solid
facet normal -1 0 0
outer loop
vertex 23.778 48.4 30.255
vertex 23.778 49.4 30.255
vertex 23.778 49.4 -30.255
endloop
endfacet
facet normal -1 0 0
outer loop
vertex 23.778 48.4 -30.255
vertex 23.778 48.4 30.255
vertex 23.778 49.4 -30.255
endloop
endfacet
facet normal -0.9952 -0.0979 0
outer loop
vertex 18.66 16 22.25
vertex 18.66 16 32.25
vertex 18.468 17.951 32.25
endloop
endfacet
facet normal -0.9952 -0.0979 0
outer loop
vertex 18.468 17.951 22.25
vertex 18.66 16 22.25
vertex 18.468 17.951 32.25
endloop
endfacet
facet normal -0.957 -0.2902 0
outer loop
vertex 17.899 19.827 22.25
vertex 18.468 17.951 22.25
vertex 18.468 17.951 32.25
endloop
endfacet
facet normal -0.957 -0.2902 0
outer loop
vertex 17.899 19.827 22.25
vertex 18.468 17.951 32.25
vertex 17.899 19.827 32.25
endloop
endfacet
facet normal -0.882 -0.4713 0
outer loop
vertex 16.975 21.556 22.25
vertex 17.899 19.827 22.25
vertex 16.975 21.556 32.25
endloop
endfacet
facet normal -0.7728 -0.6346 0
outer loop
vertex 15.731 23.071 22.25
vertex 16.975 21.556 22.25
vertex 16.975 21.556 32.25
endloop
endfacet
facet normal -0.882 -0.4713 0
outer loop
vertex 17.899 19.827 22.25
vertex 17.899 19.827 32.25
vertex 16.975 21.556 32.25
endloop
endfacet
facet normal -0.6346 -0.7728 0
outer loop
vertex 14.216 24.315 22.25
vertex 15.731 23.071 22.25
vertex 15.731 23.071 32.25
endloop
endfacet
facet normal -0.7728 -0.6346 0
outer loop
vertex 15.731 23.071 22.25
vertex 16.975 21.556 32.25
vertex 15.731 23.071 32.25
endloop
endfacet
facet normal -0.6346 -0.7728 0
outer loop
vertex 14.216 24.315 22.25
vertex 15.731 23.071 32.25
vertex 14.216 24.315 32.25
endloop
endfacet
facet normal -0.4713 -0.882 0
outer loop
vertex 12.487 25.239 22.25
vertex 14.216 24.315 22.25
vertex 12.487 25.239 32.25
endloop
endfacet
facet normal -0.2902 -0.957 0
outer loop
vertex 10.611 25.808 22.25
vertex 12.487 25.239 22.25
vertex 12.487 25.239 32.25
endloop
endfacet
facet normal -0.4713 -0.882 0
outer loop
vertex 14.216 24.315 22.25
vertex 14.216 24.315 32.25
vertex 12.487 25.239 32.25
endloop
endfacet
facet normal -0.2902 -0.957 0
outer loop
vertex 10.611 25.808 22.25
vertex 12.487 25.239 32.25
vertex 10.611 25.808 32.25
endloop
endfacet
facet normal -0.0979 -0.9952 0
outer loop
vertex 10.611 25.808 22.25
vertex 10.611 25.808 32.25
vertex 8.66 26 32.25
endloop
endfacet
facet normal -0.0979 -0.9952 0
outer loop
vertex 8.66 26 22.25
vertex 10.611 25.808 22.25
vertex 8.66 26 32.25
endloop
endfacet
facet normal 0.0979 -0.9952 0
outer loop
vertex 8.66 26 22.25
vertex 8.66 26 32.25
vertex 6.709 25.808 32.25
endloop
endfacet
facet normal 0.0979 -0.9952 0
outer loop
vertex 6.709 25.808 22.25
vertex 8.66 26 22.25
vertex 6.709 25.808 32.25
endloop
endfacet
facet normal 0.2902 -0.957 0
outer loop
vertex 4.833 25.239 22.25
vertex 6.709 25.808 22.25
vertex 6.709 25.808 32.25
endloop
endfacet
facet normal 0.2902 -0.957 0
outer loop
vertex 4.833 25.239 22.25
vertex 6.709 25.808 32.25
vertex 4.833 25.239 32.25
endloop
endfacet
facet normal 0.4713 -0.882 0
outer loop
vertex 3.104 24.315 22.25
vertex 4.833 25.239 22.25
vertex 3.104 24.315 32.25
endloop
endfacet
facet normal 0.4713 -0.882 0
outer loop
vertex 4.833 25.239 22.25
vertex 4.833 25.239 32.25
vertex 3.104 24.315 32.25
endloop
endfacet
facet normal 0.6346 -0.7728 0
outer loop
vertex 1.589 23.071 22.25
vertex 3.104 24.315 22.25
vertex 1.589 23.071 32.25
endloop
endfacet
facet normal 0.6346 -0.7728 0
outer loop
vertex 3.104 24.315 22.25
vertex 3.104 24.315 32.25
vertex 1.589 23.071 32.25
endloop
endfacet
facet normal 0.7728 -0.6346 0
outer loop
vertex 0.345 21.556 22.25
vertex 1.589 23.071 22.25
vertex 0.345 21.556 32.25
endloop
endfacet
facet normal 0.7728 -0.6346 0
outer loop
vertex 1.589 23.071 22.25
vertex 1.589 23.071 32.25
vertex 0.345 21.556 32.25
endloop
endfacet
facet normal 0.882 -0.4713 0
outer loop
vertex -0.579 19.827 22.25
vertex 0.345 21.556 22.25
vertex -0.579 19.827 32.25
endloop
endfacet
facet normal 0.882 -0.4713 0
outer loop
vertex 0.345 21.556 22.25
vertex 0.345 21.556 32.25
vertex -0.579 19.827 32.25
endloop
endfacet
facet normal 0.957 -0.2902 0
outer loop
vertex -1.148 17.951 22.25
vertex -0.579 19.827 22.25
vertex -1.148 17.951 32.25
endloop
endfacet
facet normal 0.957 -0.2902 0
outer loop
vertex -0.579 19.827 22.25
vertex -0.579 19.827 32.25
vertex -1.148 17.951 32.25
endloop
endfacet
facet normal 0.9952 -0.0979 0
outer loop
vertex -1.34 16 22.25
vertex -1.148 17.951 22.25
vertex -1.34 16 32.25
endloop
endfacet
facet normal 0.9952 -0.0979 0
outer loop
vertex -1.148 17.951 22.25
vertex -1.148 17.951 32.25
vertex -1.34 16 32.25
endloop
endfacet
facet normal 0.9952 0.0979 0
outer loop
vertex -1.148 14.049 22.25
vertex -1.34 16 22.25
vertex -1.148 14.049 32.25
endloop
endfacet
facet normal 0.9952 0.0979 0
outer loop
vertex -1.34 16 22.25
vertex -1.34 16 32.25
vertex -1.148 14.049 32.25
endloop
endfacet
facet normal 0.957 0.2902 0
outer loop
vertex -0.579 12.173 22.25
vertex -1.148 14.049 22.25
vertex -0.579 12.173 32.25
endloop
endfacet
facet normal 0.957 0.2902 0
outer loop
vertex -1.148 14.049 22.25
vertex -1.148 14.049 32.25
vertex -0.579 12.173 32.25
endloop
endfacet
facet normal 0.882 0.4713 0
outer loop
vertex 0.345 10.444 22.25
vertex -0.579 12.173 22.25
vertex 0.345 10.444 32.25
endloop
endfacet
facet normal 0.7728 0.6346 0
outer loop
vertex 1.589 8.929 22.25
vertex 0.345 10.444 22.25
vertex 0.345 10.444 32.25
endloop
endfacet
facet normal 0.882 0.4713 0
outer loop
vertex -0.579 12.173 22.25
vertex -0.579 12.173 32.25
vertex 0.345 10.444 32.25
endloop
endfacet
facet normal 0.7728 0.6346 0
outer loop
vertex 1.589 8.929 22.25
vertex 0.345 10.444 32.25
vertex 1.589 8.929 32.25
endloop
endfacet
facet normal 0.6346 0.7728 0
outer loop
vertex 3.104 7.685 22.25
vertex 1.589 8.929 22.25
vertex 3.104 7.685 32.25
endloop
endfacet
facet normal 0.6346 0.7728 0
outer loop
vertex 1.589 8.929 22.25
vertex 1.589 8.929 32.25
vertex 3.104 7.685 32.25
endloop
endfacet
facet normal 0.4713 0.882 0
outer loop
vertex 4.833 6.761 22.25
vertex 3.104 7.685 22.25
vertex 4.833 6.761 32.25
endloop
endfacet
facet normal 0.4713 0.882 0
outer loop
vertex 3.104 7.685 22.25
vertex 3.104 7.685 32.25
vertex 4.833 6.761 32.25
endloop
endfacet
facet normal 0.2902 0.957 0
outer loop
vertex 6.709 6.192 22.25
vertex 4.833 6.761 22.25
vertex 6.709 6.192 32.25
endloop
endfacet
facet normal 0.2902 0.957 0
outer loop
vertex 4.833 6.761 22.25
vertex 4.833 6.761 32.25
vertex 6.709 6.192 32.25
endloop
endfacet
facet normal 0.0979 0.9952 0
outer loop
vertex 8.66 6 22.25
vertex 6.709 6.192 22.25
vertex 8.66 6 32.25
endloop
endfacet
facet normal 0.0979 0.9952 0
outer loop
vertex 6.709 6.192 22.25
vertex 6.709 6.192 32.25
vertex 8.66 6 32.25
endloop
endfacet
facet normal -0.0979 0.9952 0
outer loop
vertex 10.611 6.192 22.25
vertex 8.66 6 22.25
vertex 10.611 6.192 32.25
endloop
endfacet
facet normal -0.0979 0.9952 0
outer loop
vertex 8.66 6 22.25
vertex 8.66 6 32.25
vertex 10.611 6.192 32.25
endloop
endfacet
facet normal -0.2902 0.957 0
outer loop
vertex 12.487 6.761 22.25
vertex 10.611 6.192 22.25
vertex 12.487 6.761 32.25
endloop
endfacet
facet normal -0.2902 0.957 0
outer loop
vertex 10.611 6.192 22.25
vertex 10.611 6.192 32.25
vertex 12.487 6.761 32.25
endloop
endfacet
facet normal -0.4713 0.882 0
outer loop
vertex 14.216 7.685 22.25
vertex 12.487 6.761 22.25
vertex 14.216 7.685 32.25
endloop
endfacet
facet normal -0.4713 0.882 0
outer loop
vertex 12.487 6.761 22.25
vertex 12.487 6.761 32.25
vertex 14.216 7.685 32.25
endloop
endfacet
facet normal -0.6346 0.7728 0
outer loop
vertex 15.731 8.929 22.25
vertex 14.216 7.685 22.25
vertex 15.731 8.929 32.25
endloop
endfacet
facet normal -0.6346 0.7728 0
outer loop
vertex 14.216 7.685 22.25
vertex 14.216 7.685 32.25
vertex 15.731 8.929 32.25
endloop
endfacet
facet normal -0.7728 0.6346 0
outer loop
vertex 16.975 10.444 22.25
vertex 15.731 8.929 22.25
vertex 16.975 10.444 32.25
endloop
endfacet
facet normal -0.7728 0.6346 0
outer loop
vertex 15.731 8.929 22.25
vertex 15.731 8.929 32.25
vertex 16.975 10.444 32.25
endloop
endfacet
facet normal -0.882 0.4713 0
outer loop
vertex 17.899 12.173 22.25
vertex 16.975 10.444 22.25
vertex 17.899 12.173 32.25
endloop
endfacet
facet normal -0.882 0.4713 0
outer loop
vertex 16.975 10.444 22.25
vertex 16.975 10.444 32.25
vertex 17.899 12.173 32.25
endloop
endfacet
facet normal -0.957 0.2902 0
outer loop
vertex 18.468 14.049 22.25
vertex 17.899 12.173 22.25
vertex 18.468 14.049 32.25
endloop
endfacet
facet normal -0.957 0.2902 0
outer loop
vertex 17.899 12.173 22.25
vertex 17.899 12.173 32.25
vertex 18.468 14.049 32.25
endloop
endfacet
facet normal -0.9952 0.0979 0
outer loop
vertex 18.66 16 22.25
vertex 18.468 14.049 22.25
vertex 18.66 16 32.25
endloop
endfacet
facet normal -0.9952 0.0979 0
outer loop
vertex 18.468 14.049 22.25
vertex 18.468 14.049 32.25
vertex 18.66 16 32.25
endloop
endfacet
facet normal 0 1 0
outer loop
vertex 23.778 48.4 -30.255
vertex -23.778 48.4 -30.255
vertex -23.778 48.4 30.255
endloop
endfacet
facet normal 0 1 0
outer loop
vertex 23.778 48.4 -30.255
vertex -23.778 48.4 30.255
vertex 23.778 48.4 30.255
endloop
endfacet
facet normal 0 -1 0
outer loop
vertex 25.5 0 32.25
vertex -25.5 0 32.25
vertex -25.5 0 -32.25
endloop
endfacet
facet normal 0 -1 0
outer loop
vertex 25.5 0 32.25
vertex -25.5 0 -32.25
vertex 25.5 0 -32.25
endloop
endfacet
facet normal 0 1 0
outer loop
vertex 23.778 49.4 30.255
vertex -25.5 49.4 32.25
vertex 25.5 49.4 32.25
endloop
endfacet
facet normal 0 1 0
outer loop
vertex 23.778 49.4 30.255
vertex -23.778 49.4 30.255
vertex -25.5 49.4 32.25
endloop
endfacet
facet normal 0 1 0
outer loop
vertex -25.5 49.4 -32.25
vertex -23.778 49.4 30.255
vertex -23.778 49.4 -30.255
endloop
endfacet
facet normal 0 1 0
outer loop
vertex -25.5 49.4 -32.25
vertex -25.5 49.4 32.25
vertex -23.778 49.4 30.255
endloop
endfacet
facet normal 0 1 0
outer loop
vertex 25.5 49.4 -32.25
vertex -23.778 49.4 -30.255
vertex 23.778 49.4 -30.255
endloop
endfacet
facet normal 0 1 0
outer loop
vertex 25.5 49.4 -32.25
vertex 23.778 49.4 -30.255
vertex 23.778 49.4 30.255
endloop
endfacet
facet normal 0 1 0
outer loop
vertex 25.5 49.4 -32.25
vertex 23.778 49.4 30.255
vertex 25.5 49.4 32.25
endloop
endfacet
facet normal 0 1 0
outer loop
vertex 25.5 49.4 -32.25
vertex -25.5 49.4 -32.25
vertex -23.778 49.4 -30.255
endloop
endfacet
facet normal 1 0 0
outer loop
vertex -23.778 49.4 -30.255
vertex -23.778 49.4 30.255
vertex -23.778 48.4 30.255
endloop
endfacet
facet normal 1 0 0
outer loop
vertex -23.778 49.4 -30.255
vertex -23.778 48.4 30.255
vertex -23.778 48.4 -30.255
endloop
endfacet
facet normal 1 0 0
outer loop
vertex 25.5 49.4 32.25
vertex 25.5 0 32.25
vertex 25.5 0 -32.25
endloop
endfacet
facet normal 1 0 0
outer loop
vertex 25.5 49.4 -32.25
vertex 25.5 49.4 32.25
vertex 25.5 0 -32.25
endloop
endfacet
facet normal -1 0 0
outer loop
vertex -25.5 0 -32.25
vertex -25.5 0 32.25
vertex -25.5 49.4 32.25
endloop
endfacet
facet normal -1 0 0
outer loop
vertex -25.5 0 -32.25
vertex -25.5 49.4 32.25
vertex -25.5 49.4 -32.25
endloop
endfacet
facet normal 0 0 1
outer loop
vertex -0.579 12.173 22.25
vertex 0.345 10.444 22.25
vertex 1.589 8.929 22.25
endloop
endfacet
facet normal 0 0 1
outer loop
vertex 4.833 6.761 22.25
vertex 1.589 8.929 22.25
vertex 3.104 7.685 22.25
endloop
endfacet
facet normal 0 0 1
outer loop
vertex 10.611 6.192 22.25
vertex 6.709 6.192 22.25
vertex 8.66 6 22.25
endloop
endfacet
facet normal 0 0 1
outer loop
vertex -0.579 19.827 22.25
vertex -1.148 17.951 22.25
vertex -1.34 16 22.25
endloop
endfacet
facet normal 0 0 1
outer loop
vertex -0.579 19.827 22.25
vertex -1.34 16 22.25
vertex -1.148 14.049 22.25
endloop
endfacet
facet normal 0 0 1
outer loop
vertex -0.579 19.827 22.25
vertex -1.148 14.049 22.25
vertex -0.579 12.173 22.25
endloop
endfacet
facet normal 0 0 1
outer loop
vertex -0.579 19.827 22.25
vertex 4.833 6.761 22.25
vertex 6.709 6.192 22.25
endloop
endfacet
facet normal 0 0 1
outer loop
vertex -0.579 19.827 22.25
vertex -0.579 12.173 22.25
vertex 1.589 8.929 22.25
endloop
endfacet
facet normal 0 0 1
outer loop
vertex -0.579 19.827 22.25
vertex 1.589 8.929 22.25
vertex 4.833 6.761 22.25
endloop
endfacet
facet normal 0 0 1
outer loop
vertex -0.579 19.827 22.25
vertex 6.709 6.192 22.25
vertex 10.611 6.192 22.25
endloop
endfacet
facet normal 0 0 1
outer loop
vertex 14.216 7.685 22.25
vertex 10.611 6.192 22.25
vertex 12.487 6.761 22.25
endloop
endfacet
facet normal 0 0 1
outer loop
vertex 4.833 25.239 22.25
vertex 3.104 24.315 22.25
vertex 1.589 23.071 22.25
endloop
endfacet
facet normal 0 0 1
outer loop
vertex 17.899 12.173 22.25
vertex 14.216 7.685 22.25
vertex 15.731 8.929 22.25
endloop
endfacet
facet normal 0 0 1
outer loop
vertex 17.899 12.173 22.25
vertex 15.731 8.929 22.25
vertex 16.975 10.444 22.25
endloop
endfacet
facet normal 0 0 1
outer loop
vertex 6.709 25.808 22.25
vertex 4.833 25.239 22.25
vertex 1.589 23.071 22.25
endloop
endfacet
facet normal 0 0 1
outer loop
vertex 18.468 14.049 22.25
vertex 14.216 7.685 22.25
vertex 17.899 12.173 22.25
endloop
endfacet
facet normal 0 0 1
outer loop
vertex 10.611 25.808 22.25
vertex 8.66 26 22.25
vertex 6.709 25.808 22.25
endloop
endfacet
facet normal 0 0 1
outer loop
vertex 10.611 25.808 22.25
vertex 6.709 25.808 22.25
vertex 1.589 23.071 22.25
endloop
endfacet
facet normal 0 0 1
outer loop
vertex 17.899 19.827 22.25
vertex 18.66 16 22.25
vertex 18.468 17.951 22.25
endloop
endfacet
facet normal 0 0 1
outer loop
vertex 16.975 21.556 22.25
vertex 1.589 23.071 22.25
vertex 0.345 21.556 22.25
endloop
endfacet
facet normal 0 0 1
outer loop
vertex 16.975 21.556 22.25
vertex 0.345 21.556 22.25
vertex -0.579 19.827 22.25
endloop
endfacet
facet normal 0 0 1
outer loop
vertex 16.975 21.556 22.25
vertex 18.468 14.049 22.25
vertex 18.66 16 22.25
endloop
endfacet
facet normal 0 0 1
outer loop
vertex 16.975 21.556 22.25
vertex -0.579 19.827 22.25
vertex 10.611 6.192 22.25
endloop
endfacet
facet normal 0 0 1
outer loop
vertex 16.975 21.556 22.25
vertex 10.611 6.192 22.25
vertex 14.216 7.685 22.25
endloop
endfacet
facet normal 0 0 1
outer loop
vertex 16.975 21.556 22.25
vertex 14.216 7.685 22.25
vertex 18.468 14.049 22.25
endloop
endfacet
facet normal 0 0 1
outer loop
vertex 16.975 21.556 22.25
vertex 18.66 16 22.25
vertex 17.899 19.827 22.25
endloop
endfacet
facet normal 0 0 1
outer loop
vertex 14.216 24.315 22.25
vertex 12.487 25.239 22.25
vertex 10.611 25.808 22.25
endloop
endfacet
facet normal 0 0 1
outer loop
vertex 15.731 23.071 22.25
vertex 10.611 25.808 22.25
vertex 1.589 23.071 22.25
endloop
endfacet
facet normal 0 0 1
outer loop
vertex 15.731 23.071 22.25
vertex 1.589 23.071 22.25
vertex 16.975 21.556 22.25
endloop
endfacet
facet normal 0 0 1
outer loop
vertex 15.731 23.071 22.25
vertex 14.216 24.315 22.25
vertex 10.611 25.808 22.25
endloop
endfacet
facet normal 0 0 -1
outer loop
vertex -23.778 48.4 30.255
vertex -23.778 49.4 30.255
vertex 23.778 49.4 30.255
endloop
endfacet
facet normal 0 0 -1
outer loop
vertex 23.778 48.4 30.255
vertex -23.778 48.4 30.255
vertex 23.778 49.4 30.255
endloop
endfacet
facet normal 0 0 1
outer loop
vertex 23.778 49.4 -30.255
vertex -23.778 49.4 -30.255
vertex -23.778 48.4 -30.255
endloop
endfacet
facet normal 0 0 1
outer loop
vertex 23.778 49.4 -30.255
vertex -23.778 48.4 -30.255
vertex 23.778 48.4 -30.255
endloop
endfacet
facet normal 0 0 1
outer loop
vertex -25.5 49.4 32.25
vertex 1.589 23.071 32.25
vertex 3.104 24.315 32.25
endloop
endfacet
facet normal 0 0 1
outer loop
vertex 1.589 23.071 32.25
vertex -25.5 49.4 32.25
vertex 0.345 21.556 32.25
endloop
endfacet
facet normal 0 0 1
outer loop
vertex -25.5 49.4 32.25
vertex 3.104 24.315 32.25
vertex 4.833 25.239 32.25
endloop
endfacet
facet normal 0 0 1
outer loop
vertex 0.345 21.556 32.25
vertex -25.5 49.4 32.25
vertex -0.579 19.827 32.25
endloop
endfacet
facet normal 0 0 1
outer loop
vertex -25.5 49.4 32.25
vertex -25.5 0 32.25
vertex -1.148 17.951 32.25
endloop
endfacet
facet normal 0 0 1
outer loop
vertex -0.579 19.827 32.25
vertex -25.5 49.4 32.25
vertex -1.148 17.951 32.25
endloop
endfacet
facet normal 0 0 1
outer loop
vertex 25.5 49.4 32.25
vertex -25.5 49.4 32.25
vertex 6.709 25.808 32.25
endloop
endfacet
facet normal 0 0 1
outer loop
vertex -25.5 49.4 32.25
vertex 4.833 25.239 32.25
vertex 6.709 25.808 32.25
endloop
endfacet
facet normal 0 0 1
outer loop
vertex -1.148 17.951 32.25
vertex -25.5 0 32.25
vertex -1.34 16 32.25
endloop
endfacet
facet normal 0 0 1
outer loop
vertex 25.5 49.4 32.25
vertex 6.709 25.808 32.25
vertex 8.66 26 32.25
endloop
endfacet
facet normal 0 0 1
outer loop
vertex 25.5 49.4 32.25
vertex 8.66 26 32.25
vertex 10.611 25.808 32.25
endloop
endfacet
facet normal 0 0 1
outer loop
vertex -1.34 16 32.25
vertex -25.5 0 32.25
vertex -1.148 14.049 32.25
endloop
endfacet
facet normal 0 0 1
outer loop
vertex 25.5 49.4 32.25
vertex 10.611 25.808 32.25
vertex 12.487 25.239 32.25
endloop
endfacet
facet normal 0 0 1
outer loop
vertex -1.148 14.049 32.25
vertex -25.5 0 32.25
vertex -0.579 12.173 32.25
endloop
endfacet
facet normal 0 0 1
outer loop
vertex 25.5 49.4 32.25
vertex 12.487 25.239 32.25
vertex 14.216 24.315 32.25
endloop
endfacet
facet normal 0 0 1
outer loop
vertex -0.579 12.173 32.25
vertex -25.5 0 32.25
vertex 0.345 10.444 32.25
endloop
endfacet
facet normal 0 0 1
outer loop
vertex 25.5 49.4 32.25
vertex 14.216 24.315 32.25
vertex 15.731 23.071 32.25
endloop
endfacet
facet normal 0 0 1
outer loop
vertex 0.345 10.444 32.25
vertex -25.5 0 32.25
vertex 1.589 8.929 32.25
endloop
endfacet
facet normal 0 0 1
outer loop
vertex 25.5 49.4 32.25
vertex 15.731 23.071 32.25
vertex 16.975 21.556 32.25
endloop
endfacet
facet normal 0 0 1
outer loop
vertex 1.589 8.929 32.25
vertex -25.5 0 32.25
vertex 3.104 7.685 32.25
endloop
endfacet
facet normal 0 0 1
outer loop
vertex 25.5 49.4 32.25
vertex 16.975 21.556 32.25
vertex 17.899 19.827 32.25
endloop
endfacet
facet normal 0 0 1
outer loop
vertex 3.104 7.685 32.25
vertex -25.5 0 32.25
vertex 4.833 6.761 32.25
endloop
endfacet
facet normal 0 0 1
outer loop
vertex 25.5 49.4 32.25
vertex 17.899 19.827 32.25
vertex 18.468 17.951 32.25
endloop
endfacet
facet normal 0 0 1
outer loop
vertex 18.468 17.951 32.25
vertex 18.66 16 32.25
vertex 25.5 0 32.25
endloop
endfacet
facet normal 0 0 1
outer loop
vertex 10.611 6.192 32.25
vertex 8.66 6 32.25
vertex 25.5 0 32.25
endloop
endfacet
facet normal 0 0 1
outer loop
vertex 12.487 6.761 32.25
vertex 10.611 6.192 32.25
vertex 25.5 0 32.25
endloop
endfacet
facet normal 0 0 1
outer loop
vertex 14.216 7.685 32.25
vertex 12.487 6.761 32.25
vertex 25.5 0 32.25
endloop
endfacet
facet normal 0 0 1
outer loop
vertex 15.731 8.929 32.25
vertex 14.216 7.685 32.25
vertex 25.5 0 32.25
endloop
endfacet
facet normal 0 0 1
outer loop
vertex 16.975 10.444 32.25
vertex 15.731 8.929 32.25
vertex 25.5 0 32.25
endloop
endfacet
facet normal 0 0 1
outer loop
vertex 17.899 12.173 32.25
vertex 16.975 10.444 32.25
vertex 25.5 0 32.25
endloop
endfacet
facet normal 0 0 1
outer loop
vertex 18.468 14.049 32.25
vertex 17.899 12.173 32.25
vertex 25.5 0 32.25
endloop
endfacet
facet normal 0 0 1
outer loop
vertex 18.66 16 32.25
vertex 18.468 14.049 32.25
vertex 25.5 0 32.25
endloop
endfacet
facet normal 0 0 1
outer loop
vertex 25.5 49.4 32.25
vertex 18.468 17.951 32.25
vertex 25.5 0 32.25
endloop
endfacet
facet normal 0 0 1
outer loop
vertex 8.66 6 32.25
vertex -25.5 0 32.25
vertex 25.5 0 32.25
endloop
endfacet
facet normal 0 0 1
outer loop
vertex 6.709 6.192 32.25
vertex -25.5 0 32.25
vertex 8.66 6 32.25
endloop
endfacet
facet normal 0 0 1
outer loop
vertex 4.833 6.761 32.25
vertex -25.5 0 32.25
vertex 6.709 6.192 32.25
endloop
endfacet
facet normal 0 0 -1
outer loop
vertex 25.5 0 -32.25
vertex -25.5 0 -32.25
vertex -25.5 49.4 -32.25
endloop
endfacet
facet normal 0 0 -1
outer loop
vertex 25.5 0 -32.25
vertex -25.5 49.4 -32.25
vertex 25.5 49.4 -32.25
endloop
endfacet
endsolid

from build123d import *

# Parameters (mm, degrees)
SKETCH1_W           = 51
SKETCH1_H           = 64.5
BOSS_EXTRUDE1_DEPTH = 49.4
SKETCH2_R           = 10
CUT_EXTRUDE1_DEPTH  = 10
SKETCH3_W           = 47.55649051
SKETCH3_H           = 60.50962022
CUT_EXTRUDE2_DEPTH  = 1


with BuildPart() as part:
    # Sketch1 → Boss-Extrude1 (new body)
    with BuildSketch(Plane(origin=(0, 0, 0), x_dir=(1, 0, 0), z_dir=(0, 1, 0))):
        Rectangle(SKETCH1_W, SKETCH1_H)
    extrude(amount=BOSS_EXTRUDE1_DEPTH)

    # Sketch2 → Cut-Extrude1 (cut)
    with BuildSketch(Plane.XY.offset(32.25)):
        with Locations((8.66, 16)):
            Circle(SKETCH2_R)
    extrude(amount=-CUT_EXTRUDE1_DEPTH, mode=Mode.SUBTRACT)

    # Sketch3 → Cut-Extrude2 (cut)
    with BuildSketch(Plane(origin=(0, 49.4, 0), x_dir=(1, 0, 0), z_dir=(0, 1, 0))):
        Rectangle(SKETCH3_W, SKETCH3_H)
    extrude(amount=-CUT_EXTRUDE2_DEPTH, mode=Mode.SUBTRACT)


solid = part.part
